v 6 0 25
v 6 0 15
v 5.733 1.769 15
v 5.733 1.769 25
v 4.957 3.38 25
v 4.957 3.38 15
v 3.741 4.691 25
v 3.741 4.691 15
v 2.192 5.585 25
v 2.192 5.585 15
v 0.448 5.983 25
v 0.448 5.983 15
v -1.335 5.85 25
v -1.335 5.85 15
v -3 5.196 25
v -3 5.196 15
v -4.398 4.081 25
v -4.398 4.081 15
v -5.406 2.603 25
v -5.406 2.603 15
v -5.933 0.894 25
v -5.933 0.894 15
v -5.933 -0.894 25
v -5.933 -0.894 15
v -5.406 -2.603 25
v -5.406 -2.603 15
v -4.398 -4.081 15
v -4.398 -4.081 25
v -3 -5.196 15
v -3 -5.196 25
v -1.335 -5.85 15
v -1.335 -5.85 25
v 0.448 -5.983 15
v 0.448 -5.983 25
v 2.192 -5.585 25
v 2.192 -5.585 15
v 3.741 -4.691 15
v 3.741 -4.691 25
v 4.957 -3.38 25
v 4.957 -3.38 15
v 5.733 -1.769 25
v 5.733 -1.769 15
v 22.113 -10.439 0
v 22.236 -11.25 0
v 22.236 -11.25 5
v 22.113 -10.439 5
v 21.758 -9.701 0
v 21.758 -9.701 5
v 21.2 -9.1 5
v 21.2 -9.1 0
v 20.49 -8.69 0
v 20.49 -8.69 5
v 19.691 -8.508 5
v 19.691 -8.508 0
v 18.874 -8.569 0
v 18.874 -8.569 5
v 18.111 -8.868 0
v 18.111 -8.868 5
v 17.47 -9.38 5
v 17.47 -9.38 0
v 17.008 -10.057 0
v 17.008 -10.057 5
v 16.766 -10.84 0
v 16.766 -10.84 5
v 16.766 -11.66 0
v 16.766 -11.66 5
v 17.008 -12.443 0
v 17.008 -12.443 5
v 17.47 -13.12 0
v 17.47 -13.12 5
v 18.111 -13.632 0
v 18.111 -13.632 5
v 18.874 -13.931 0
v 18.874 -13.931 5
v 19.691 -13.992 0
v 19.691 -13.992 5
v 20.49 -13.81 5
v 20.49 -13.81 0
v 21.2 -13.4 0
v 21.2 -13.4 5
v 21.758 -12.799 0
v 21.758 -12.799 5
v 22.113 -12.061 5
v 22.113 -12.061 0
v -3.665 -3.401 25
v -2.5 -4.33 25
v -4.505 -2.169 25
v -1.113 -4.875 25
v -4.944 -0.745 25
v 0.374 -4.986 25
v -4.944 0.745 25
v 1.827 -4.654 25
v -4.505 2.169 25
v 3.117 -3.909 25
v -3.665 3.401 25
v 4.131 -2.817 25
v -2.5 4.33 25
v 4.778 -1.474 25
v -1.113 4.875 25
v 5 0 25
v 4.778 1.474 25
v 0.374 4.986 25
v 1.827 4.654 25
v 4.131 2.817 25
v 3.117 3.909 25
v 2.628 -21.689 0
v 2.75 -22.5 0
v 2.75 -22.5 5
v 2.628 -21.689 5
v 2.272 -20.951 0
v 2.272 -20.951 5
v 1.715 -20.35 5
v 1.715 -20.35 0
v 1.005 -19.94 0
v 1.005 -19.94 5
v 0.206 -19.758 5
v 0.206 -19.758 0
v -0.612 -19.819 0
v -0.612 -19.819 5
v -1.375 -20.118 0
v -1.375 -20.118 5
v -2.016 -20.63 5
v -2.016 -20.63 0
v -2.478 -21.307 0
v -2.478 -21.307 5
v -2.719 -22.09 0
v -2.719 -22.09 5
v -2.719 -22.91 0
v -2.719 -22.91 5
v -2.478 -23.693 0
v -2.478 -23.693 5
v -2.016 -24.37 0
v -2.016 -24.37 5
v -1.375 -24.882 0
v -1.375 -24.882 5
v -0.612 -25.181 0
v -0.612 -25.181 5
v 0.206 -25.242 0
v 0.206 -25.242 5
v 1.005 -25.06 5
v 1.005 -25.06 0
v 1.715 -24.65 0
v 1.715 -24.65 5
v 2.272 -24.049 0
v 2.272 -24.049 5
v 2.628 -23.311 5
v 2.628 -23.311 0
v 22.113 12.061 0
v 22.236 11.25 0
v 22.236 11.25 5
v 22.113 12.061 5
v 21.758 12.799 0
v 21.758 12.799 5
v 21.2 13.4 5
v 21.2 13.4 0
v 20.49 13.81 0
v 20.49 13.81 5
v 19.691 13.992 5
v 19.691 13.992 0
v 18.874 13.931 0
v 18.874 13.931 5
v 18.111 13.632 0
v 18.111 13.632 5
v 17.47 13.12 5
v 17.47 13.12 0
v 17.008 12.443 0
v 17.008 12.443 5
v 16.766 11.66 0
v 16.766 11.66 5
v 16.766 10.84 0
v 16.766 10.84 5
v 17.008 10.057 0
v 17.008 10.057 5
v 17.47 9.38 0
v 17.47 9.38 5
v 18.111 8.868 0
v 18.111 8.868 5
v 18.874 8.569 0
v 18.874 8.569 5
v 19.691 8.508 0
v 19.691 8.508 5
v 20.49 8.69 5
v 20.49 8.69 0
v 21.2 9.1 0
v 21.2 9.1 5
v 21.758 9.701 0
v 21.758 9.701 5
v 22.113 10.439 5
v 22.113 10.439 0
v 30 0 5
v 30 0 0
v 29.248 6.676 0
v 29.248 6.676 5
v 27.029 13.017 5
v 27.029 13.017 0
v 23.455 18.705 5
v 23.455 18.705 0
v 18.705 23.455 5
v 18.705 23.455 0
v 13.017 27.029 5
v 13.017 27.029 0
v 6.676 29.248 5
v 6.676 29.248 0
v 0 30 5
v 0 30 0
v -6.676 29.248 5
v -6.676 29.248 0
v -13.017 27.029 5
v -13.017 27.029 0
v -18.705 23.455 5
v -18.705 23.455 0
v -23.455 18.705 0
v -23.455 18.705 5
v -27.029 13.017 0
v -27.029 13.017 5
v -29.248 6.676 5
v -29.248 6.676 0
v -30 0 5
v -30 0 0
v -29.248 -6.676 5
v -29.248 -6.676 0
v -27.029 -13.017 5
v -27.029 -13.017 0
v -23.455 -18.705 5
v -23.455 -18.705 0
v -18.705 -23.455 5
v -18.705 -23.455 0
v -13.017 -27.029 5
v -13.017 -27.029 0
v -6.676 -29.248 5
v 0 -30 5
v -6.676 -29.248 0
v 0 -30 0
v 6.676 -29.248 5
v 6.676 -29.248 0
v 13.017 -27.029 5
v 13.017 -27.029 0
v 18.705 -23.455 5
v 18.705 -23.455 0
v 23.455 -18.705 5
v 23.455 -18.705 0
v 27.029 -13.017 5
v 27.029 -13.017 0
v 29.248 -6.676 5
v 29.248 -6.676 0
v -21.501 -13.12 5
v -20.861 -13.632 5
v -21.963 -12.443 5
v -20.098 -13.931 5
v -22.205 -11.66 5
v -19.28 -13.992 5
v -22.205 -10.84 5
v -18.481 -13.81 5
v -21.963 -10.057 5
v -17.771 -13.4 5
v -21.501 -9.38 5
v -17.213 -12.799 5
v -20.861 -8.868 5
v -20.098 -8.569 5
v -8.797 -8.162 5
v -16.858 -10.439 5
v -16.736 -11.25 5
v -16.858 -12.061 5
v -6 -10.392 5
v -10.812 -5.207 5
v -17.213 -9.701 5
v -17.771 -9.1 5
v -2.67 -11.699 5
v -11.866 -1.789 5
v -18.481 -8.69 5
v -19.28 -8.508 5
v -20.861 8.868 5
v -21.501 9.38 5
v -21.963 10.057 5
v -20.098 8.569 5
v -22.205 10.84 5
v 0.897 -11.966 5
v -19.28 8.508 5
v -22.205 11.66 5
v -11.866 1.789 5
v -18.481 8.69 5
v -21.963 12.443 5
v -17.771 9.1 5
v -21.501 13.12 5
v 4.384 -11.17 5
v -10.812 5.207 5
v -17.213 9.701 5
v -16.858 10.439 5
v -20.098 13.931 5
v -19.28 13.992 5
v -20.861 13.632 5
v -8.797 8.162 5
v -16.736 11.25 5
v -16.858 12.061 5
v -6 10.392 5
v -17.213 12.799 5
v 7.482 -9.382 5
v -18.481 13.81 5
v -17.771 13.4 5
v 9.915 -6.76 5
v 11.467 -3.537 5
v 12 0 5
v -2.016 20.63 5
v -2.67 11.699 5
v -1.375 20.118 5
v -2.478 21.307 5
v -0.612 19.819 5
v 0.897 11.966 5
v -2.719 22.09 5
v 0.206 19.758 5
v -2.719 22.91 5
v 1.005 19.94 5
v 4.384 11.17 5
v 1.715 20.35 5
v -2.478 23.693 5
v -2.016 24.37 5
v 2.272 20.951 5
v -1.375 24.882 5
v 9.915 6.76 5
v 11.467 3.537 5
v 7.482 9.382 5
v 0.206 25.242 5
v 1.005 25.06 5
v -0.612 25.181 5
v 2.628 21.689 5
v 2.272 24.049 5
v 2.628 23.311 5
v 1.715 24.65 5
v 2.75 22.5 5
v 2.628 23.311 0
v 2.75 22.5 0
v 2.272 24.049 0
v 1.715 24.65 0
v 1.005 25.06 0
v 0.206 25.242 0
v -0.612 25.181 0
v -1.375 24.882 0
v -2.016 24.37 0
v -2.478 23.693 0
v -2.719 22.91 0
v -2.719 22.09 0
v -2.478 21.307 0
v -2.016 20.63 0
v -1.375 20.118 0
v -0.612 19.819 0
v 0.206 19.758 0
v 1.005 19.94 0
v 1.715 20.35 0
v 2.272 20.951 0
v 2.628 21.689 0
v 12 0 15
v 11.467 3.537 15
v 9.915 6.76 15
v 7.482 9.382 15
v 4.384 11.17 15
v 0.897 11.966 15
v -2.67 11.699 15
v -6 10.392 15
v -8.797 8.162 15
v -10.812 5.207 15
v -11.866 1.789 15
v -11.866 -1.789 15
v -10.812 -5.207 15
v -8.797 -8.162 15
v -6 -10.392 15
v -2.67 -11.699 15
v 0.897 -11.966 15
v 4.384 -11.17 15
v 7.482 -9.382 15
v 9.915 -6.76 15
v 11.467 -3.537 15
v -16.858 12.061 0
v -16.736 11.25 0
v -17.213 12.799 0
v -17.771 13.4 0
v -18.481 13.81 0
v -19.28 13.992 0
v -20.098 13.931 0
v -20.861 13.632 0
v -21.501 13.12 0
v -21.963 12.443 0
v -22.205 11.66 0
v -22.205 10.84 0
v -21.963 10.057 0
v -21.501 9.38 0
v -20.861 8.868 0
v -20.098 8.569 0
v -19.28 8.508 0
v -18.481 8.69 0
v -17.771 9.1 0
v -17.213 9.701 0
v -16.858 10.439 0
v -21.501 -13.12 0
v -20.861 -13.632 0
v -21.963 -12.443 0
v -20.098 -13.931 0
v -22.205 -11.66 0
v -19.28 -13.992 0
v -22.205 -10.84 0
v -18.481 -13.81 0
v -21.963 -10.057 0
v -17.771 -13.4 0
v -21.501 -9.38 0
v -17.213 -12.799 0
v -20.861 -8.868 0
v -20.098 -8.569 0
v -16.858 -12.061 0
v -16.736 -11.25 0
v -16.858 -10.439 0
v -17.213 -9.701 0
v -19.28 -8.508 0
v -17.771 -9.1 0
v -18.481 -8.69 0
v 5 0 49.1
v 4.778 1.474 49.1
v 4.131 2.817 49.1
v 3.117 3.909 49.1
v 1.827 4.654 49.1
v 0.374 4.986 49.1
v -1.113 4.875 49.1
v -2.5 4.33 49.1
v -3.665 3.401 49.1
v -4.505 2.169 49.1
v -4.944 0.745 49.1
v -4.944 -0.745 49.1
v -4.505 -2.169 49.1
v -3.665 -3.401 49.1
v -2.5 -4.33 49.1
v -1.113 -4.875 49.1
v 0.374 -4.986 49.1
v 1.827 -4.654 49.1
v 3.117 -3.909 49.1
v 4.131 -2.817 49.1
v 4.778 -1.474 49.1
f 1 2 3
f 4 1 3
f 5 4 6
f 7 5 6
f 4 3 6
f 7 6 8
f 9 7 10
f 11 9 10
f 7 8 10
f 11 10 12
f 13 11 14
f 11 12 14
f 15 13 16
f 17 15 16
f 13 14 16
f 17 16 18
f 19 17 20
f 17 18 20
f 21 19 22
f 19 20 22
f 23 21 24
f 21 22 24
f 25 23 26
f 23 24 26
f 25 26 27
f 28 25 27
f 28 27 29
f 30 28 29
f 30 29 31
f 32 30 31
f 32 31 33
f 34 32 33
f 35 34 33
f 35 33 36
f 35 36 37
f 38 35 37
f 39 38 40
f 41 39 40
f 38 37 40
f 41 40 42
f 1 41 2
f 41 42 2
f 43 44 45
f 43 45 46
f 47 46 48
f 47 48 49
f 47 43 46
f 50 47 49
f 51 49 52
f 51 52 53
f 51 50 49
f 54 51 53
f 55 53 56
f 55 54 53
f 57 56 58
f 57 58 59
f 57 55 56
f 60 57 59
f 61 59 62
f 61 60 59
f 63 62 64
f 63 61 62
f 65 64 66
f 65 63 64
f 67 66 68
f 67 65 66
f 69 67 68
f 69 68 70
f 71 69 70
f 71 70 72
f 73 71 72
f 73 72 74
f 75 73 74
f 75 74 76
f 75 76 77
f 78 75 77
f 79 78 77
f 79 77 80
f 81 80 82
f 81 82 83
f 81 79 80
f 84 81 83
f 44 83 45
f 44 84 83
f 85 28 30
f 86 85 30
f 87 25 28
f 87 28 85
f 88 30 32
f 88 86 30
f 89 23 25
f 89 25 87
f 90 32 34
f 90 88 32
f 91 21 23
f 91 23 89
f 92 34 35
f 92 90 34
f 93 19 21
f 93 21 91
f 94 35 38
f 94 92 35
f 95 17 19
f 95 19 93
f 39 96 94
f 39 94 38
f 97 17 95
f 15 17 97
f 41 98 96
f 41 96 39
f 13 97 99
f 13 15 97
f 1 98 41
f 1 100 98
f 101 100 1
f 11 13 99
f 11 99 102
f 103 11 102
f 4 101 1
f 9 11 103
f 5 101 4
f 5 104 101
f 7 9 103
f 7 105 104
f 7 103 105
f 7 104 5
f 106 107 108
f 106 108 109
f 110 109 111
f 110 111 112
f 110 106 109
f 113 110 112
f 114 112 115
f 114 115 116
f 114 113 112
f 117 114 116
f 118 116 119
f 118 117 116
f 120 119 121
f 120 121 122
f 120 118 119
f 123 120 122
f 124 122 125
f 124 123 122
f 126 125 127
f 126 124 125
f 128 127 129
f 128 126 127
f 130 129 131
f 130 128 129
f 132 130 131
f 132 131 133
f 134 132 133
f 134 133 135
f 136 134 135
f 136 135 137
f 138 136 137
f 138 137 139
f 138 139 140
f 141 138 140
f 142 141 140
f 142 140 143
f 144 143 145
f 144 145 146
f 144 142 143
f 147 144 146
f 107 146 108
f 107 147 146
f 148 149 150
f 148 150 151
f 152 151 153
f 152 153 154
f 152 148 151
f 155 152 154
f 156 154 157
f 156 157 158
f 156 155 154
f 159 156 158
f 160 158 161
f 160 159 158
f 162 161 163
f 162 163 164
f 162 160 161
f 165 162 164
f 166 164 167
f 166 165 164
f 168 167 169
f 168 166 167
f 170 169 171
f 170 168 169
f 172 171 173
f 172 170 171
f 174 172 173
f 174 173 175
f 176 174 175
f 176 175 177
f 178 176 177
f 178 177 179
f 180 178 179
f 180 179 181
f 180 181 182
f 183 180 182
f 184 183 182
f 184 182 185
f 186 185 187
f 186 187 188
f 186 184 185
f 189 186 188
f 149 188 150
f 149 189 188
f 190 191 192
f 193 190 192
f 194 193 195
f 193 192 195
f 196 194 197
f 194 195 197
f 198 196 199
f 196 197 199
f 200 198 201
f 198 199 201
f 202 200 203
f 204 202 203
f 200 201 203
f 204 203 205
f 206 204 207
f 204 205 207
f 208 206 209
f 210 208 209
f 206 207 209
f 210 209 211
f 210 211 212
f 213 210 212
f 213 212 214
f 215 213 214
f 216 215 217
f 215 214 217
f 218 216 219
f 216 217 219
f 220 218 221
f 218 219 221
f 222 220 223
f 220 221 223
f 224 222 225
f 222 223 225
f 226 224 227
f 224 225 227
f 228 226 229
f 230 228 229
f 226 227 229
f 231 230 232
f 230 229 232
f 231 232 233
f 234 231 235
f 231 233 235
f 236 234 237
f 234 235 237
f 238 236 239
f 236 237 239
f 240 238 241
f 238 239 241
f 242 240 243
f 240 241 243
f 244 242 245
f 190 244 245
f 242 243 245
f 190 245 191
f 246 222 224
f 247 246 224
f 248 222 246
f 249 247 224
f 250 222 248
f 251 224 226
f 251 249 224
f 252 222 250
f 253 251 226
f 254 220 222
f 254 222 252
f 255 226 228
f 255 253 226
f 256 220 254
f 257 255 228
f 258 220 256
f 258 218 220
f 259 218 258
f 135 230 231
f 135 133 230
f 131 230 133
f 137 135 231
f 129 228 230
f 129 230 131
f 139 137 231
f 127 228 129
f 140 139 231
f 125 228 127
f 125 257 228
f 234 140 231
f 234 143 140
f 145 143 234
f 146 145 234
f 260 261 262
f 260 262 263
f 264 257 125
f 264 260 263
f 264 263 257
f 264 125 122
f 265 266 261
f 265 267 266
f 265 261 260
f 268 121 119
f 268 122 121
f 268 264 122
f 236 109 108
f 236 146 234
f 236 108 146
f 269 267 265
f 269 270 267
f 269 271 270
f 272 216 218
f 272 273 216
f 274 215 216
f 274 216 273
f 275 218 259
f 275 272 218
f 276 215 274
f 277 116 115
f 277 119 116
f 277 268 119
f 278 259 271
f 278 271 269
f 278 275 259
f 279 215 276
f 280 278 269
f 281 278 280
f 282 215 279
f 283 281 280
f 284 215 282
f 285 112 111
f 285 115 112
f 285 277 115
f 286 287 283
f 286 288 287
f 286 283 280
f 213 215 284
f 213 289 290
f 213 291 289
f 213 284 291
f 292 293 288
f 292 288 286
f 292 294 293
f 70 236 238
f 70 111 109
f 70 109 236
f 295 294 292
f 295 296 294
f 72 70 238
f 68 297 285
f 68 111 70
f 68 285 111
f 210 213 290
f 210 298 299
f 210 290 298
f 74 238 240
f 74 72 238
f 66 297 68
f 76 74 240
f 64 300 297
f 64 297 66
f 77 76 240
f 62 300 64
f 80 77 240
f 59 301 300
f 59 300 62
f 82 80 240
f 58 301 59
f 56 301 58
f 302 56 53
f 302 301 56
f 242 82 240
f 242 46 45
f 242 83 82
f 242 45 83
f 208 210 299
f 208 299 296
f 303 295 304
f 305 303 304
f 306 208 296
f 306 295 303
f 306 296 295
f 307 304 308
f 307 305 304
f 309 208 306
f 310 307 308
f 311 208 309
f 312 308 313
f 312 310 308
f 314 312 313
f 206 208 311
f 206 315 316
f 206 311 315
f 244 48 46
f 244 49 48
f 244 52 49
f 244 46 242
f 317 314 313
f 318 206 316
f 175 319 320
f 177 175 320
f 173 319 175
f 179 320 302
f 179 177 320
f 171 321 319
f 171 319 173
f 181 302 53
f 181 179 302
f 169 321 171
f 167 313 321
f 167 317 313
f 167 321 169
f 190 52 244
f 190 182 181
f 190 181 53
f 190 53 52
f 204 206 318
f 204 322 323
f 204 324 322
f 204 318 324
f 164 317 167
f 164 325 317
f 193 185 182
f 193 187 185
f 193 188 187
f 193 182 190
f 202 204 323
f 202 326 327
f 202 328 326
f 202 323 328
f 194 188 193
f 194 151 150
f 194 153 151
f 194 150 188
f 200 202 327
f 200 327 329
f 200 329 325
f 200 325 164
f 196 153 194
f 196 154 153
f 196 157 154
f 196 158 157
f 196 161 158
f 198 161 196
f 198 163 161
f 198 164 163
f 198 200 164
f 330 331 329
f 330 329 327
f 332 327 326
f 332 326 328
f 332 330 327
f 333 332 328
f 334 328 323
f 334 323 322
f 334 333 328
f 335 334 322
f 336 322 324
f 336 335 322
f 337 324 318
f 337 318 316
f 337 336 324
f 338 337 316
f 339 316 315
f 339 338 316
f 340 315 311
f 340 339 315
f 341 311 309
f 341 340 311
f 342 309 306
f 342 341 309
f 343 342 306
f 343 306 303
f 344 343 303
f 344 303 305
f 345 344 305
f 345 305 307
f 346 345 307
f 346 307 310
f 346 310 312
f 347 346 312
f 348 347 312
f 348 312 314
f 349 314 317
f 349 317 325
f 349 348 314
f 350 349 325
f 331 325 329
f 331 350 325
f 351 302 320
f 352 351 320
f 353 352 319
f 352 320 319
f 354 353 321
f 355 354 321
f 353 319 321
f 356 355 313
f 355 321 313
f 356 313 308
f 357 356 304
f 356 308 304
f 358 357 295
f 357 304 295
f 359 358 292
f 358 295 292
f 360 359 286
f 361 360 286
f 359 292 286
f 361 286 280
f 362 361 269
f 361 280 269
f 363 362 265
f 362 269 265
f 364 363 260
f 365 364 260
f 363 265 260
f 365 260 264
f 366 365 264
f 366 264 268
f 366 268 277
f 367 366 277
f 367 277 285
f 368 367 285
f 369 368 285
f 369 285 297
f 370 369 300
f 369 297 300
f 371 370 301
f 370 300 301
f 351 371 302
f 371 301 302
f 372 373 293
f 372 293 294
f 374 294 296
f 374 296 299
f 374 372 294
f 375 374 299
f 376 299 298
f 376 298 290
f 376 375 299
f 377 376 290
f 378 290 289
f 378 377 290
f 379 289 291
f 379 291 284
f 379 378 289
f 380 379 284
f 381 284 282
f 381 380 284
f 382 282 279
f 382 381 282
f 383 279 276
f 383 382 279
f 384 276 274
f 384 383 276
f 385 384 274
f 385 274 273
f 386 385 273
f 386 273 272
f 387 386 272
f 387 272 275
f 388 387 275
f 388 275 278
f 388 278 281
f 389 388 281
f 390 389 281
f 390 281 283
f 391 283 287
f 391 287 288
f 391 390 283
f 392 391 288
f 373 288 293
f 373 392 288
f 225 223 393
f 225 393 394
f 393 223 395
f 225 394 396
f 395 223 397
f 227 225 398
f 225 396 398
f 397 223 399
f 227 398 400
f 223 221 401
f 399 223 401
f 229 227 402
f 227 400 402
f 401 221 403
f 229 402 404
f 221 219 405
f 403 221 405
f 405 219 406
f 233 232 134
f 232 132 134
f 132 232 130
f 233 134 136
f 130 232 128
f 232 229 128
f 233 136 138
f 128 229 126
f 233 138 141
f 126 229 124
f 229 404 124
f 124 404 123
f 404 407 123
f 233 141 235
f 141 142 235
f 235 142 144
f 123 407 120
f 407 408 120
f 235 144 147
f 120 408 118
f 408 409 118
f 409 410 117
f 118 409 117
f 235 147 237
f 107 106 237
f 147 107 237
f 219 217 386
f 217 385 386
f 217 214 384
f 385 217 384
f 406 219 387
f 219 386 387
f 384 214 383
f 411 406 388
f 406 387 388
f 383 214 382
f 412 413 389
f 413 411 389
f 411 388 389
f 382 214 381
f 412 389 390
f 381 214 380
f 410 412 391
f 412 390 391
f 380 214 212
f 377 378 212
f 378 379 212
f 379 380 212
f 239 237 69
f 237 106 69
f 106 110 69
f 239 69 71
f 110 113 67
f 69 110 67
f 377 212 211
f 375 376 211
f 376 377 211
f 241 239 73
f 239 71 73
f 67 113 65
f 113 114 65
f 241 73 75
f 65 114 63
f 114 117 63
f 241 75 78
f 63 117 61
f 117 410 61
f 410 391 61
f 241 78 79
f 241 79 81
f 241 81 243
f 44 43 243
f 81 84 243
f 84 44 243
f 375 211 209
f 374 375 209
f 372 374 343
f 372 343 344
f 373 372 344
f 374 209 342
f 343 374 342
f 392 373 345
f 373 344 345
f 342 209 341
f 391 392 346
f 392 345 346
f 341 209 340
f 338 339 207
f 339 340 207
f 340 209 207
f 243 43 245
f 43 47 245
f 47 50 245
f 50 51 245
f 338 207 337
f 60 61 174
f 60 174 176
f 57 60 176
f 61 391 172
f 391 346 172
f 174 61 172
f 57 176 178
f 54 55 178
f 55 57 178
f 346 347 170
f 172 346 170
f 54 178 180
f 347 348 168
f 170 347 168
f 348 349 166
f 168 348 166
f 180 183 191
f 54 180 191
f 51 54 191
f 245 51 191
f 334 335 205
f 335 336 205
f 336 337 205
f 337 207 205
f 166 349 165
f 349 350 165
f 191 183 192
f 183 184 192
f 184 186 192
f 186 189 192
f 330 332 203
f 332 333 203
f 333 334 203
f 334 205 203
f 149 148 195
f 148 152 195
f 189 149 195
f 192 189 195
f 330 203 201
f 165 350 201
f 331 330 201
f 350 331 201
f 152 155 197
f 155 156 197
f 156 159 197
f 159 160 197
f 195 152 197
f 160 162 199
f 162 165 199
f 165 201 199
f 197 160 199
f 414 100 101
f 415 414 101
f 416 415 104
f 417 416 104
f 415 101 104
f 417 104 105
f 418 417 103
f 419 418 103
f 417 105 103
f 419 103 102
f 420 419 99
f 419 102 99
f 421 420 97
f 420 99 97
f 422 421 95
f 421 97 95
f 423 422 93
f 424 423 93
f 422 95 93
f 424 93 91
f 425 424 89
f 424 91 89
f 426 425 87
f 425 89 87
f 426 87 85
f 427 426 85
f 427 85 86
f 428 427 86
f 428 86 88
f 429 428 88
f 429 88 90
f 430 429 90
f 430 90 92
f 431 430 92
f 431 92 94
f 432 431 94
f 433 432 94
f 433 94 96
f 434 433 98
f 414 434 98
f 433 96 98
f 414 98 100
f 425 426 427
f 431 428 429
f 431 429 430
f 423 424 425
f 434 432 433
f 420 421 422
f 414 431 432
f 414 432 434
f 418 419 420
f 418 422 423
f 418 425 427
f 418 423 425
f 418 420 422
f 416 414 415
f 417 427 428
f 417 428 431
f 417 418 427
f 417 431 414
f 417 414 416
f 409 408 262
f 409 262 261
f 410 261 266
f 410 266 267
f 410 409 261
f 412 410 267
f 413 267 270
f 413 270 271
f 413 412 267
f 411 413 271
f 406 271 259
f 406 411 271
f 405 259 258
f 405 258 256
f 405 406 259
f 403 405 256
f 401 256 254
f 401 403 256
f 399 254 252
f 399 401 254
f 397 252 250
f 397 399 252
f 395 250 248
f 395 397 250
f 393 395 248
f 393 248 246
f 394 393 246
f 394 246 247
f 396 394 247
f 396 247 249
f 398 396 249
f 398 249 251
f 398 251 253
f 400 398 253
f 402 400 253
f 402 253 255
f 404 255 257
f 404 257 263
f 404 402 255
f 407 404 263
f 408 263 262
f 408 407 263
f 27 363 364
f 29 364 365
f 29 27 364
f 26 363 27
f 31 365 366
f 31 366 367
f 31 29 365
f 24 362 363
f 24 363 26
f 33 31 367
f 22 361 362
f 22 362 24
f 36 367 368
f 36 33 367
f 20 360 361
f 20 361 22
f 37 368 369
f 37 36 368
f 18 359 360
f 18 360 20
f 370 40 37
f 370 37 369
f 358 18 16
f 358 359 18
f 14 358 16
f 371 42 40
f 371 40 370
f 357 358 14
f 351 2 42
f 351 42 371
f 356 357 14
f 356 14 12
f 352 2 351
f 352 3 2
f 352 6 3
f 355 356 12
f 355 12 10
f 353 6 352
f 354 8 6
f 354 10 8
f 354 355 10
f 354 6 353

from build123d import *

# Parameters (mm, degrees)
SKETCH_1_R      = 30
SKETCH_1_R_2    = 2.75
EXTRUDE_1_DEPTH = 5
SKETCH_2_R      = 12
EXTRUDE_2_DEPTH = 10
SKETCH_3_R      = 6
EXTRUDE_3_DEPTH = 10
SKETCH_5_R      = 5
EXTRUDE_4_DEPTH = 24.1


with BuildPart() as part:
    # 草图1 → 凸台-拉伸1 (new body)
    with BuildSketch(Plane.XY):
        Circle(SKETCH_1_R)
        with Locations((0, 22.5)):
            Circle(SKETCH_1_R_2, mode=Mode.SUBTRACT)
        with Locations((19.485571585, 11.25)):
            Circle(SKETCH_1_R_2, mode=Mode.SUBTRACT)
        with Locations((19.485571585, -11.25)):
            Circle(SKETCH_1_R_2, mode=Mode.SUBTRACT)
        with Locations((0, -22.5)):
            Circle(SKETCH_1_R_2, mode=Mode.SUBTRACT)
        with Locations((-19.485571585, -11.25)):
            Circle(SKETCH_1_R_2, mode=Mode.SUBTRACT)
        with Locations((-19.485571585, 11.25)):
            Circle(SKETCH_1_R_2, mode=Mode.SUBTRACT)
    extrude(amount=EXTRUDE_1_DEPTH)

    # 草图2 → 凸台-拉伸2 (add)
    with BuildSketch(Plane.XY.offset(5)):
        Circle(SKETCH_2_R)
    extrude(amount=EXTRUDE_2_DEPTH)

    # 草图3 → 凸台-拉伸3 (add)
    with BuildSketch(Plane.XY.offset(15)):
        Circle(SKETCH_3_R)
    extrude(amount=EXTRUDE_3_DEPTH)

    # 草图5 → 凸台-拉伸4 (add)
    with BuildSketch(Plane.XY.offset(25)):
        Circle(SKETCH_5_R)
    extrude(amount=EXTRUDE_4_DEPTH)


solid = part.part
